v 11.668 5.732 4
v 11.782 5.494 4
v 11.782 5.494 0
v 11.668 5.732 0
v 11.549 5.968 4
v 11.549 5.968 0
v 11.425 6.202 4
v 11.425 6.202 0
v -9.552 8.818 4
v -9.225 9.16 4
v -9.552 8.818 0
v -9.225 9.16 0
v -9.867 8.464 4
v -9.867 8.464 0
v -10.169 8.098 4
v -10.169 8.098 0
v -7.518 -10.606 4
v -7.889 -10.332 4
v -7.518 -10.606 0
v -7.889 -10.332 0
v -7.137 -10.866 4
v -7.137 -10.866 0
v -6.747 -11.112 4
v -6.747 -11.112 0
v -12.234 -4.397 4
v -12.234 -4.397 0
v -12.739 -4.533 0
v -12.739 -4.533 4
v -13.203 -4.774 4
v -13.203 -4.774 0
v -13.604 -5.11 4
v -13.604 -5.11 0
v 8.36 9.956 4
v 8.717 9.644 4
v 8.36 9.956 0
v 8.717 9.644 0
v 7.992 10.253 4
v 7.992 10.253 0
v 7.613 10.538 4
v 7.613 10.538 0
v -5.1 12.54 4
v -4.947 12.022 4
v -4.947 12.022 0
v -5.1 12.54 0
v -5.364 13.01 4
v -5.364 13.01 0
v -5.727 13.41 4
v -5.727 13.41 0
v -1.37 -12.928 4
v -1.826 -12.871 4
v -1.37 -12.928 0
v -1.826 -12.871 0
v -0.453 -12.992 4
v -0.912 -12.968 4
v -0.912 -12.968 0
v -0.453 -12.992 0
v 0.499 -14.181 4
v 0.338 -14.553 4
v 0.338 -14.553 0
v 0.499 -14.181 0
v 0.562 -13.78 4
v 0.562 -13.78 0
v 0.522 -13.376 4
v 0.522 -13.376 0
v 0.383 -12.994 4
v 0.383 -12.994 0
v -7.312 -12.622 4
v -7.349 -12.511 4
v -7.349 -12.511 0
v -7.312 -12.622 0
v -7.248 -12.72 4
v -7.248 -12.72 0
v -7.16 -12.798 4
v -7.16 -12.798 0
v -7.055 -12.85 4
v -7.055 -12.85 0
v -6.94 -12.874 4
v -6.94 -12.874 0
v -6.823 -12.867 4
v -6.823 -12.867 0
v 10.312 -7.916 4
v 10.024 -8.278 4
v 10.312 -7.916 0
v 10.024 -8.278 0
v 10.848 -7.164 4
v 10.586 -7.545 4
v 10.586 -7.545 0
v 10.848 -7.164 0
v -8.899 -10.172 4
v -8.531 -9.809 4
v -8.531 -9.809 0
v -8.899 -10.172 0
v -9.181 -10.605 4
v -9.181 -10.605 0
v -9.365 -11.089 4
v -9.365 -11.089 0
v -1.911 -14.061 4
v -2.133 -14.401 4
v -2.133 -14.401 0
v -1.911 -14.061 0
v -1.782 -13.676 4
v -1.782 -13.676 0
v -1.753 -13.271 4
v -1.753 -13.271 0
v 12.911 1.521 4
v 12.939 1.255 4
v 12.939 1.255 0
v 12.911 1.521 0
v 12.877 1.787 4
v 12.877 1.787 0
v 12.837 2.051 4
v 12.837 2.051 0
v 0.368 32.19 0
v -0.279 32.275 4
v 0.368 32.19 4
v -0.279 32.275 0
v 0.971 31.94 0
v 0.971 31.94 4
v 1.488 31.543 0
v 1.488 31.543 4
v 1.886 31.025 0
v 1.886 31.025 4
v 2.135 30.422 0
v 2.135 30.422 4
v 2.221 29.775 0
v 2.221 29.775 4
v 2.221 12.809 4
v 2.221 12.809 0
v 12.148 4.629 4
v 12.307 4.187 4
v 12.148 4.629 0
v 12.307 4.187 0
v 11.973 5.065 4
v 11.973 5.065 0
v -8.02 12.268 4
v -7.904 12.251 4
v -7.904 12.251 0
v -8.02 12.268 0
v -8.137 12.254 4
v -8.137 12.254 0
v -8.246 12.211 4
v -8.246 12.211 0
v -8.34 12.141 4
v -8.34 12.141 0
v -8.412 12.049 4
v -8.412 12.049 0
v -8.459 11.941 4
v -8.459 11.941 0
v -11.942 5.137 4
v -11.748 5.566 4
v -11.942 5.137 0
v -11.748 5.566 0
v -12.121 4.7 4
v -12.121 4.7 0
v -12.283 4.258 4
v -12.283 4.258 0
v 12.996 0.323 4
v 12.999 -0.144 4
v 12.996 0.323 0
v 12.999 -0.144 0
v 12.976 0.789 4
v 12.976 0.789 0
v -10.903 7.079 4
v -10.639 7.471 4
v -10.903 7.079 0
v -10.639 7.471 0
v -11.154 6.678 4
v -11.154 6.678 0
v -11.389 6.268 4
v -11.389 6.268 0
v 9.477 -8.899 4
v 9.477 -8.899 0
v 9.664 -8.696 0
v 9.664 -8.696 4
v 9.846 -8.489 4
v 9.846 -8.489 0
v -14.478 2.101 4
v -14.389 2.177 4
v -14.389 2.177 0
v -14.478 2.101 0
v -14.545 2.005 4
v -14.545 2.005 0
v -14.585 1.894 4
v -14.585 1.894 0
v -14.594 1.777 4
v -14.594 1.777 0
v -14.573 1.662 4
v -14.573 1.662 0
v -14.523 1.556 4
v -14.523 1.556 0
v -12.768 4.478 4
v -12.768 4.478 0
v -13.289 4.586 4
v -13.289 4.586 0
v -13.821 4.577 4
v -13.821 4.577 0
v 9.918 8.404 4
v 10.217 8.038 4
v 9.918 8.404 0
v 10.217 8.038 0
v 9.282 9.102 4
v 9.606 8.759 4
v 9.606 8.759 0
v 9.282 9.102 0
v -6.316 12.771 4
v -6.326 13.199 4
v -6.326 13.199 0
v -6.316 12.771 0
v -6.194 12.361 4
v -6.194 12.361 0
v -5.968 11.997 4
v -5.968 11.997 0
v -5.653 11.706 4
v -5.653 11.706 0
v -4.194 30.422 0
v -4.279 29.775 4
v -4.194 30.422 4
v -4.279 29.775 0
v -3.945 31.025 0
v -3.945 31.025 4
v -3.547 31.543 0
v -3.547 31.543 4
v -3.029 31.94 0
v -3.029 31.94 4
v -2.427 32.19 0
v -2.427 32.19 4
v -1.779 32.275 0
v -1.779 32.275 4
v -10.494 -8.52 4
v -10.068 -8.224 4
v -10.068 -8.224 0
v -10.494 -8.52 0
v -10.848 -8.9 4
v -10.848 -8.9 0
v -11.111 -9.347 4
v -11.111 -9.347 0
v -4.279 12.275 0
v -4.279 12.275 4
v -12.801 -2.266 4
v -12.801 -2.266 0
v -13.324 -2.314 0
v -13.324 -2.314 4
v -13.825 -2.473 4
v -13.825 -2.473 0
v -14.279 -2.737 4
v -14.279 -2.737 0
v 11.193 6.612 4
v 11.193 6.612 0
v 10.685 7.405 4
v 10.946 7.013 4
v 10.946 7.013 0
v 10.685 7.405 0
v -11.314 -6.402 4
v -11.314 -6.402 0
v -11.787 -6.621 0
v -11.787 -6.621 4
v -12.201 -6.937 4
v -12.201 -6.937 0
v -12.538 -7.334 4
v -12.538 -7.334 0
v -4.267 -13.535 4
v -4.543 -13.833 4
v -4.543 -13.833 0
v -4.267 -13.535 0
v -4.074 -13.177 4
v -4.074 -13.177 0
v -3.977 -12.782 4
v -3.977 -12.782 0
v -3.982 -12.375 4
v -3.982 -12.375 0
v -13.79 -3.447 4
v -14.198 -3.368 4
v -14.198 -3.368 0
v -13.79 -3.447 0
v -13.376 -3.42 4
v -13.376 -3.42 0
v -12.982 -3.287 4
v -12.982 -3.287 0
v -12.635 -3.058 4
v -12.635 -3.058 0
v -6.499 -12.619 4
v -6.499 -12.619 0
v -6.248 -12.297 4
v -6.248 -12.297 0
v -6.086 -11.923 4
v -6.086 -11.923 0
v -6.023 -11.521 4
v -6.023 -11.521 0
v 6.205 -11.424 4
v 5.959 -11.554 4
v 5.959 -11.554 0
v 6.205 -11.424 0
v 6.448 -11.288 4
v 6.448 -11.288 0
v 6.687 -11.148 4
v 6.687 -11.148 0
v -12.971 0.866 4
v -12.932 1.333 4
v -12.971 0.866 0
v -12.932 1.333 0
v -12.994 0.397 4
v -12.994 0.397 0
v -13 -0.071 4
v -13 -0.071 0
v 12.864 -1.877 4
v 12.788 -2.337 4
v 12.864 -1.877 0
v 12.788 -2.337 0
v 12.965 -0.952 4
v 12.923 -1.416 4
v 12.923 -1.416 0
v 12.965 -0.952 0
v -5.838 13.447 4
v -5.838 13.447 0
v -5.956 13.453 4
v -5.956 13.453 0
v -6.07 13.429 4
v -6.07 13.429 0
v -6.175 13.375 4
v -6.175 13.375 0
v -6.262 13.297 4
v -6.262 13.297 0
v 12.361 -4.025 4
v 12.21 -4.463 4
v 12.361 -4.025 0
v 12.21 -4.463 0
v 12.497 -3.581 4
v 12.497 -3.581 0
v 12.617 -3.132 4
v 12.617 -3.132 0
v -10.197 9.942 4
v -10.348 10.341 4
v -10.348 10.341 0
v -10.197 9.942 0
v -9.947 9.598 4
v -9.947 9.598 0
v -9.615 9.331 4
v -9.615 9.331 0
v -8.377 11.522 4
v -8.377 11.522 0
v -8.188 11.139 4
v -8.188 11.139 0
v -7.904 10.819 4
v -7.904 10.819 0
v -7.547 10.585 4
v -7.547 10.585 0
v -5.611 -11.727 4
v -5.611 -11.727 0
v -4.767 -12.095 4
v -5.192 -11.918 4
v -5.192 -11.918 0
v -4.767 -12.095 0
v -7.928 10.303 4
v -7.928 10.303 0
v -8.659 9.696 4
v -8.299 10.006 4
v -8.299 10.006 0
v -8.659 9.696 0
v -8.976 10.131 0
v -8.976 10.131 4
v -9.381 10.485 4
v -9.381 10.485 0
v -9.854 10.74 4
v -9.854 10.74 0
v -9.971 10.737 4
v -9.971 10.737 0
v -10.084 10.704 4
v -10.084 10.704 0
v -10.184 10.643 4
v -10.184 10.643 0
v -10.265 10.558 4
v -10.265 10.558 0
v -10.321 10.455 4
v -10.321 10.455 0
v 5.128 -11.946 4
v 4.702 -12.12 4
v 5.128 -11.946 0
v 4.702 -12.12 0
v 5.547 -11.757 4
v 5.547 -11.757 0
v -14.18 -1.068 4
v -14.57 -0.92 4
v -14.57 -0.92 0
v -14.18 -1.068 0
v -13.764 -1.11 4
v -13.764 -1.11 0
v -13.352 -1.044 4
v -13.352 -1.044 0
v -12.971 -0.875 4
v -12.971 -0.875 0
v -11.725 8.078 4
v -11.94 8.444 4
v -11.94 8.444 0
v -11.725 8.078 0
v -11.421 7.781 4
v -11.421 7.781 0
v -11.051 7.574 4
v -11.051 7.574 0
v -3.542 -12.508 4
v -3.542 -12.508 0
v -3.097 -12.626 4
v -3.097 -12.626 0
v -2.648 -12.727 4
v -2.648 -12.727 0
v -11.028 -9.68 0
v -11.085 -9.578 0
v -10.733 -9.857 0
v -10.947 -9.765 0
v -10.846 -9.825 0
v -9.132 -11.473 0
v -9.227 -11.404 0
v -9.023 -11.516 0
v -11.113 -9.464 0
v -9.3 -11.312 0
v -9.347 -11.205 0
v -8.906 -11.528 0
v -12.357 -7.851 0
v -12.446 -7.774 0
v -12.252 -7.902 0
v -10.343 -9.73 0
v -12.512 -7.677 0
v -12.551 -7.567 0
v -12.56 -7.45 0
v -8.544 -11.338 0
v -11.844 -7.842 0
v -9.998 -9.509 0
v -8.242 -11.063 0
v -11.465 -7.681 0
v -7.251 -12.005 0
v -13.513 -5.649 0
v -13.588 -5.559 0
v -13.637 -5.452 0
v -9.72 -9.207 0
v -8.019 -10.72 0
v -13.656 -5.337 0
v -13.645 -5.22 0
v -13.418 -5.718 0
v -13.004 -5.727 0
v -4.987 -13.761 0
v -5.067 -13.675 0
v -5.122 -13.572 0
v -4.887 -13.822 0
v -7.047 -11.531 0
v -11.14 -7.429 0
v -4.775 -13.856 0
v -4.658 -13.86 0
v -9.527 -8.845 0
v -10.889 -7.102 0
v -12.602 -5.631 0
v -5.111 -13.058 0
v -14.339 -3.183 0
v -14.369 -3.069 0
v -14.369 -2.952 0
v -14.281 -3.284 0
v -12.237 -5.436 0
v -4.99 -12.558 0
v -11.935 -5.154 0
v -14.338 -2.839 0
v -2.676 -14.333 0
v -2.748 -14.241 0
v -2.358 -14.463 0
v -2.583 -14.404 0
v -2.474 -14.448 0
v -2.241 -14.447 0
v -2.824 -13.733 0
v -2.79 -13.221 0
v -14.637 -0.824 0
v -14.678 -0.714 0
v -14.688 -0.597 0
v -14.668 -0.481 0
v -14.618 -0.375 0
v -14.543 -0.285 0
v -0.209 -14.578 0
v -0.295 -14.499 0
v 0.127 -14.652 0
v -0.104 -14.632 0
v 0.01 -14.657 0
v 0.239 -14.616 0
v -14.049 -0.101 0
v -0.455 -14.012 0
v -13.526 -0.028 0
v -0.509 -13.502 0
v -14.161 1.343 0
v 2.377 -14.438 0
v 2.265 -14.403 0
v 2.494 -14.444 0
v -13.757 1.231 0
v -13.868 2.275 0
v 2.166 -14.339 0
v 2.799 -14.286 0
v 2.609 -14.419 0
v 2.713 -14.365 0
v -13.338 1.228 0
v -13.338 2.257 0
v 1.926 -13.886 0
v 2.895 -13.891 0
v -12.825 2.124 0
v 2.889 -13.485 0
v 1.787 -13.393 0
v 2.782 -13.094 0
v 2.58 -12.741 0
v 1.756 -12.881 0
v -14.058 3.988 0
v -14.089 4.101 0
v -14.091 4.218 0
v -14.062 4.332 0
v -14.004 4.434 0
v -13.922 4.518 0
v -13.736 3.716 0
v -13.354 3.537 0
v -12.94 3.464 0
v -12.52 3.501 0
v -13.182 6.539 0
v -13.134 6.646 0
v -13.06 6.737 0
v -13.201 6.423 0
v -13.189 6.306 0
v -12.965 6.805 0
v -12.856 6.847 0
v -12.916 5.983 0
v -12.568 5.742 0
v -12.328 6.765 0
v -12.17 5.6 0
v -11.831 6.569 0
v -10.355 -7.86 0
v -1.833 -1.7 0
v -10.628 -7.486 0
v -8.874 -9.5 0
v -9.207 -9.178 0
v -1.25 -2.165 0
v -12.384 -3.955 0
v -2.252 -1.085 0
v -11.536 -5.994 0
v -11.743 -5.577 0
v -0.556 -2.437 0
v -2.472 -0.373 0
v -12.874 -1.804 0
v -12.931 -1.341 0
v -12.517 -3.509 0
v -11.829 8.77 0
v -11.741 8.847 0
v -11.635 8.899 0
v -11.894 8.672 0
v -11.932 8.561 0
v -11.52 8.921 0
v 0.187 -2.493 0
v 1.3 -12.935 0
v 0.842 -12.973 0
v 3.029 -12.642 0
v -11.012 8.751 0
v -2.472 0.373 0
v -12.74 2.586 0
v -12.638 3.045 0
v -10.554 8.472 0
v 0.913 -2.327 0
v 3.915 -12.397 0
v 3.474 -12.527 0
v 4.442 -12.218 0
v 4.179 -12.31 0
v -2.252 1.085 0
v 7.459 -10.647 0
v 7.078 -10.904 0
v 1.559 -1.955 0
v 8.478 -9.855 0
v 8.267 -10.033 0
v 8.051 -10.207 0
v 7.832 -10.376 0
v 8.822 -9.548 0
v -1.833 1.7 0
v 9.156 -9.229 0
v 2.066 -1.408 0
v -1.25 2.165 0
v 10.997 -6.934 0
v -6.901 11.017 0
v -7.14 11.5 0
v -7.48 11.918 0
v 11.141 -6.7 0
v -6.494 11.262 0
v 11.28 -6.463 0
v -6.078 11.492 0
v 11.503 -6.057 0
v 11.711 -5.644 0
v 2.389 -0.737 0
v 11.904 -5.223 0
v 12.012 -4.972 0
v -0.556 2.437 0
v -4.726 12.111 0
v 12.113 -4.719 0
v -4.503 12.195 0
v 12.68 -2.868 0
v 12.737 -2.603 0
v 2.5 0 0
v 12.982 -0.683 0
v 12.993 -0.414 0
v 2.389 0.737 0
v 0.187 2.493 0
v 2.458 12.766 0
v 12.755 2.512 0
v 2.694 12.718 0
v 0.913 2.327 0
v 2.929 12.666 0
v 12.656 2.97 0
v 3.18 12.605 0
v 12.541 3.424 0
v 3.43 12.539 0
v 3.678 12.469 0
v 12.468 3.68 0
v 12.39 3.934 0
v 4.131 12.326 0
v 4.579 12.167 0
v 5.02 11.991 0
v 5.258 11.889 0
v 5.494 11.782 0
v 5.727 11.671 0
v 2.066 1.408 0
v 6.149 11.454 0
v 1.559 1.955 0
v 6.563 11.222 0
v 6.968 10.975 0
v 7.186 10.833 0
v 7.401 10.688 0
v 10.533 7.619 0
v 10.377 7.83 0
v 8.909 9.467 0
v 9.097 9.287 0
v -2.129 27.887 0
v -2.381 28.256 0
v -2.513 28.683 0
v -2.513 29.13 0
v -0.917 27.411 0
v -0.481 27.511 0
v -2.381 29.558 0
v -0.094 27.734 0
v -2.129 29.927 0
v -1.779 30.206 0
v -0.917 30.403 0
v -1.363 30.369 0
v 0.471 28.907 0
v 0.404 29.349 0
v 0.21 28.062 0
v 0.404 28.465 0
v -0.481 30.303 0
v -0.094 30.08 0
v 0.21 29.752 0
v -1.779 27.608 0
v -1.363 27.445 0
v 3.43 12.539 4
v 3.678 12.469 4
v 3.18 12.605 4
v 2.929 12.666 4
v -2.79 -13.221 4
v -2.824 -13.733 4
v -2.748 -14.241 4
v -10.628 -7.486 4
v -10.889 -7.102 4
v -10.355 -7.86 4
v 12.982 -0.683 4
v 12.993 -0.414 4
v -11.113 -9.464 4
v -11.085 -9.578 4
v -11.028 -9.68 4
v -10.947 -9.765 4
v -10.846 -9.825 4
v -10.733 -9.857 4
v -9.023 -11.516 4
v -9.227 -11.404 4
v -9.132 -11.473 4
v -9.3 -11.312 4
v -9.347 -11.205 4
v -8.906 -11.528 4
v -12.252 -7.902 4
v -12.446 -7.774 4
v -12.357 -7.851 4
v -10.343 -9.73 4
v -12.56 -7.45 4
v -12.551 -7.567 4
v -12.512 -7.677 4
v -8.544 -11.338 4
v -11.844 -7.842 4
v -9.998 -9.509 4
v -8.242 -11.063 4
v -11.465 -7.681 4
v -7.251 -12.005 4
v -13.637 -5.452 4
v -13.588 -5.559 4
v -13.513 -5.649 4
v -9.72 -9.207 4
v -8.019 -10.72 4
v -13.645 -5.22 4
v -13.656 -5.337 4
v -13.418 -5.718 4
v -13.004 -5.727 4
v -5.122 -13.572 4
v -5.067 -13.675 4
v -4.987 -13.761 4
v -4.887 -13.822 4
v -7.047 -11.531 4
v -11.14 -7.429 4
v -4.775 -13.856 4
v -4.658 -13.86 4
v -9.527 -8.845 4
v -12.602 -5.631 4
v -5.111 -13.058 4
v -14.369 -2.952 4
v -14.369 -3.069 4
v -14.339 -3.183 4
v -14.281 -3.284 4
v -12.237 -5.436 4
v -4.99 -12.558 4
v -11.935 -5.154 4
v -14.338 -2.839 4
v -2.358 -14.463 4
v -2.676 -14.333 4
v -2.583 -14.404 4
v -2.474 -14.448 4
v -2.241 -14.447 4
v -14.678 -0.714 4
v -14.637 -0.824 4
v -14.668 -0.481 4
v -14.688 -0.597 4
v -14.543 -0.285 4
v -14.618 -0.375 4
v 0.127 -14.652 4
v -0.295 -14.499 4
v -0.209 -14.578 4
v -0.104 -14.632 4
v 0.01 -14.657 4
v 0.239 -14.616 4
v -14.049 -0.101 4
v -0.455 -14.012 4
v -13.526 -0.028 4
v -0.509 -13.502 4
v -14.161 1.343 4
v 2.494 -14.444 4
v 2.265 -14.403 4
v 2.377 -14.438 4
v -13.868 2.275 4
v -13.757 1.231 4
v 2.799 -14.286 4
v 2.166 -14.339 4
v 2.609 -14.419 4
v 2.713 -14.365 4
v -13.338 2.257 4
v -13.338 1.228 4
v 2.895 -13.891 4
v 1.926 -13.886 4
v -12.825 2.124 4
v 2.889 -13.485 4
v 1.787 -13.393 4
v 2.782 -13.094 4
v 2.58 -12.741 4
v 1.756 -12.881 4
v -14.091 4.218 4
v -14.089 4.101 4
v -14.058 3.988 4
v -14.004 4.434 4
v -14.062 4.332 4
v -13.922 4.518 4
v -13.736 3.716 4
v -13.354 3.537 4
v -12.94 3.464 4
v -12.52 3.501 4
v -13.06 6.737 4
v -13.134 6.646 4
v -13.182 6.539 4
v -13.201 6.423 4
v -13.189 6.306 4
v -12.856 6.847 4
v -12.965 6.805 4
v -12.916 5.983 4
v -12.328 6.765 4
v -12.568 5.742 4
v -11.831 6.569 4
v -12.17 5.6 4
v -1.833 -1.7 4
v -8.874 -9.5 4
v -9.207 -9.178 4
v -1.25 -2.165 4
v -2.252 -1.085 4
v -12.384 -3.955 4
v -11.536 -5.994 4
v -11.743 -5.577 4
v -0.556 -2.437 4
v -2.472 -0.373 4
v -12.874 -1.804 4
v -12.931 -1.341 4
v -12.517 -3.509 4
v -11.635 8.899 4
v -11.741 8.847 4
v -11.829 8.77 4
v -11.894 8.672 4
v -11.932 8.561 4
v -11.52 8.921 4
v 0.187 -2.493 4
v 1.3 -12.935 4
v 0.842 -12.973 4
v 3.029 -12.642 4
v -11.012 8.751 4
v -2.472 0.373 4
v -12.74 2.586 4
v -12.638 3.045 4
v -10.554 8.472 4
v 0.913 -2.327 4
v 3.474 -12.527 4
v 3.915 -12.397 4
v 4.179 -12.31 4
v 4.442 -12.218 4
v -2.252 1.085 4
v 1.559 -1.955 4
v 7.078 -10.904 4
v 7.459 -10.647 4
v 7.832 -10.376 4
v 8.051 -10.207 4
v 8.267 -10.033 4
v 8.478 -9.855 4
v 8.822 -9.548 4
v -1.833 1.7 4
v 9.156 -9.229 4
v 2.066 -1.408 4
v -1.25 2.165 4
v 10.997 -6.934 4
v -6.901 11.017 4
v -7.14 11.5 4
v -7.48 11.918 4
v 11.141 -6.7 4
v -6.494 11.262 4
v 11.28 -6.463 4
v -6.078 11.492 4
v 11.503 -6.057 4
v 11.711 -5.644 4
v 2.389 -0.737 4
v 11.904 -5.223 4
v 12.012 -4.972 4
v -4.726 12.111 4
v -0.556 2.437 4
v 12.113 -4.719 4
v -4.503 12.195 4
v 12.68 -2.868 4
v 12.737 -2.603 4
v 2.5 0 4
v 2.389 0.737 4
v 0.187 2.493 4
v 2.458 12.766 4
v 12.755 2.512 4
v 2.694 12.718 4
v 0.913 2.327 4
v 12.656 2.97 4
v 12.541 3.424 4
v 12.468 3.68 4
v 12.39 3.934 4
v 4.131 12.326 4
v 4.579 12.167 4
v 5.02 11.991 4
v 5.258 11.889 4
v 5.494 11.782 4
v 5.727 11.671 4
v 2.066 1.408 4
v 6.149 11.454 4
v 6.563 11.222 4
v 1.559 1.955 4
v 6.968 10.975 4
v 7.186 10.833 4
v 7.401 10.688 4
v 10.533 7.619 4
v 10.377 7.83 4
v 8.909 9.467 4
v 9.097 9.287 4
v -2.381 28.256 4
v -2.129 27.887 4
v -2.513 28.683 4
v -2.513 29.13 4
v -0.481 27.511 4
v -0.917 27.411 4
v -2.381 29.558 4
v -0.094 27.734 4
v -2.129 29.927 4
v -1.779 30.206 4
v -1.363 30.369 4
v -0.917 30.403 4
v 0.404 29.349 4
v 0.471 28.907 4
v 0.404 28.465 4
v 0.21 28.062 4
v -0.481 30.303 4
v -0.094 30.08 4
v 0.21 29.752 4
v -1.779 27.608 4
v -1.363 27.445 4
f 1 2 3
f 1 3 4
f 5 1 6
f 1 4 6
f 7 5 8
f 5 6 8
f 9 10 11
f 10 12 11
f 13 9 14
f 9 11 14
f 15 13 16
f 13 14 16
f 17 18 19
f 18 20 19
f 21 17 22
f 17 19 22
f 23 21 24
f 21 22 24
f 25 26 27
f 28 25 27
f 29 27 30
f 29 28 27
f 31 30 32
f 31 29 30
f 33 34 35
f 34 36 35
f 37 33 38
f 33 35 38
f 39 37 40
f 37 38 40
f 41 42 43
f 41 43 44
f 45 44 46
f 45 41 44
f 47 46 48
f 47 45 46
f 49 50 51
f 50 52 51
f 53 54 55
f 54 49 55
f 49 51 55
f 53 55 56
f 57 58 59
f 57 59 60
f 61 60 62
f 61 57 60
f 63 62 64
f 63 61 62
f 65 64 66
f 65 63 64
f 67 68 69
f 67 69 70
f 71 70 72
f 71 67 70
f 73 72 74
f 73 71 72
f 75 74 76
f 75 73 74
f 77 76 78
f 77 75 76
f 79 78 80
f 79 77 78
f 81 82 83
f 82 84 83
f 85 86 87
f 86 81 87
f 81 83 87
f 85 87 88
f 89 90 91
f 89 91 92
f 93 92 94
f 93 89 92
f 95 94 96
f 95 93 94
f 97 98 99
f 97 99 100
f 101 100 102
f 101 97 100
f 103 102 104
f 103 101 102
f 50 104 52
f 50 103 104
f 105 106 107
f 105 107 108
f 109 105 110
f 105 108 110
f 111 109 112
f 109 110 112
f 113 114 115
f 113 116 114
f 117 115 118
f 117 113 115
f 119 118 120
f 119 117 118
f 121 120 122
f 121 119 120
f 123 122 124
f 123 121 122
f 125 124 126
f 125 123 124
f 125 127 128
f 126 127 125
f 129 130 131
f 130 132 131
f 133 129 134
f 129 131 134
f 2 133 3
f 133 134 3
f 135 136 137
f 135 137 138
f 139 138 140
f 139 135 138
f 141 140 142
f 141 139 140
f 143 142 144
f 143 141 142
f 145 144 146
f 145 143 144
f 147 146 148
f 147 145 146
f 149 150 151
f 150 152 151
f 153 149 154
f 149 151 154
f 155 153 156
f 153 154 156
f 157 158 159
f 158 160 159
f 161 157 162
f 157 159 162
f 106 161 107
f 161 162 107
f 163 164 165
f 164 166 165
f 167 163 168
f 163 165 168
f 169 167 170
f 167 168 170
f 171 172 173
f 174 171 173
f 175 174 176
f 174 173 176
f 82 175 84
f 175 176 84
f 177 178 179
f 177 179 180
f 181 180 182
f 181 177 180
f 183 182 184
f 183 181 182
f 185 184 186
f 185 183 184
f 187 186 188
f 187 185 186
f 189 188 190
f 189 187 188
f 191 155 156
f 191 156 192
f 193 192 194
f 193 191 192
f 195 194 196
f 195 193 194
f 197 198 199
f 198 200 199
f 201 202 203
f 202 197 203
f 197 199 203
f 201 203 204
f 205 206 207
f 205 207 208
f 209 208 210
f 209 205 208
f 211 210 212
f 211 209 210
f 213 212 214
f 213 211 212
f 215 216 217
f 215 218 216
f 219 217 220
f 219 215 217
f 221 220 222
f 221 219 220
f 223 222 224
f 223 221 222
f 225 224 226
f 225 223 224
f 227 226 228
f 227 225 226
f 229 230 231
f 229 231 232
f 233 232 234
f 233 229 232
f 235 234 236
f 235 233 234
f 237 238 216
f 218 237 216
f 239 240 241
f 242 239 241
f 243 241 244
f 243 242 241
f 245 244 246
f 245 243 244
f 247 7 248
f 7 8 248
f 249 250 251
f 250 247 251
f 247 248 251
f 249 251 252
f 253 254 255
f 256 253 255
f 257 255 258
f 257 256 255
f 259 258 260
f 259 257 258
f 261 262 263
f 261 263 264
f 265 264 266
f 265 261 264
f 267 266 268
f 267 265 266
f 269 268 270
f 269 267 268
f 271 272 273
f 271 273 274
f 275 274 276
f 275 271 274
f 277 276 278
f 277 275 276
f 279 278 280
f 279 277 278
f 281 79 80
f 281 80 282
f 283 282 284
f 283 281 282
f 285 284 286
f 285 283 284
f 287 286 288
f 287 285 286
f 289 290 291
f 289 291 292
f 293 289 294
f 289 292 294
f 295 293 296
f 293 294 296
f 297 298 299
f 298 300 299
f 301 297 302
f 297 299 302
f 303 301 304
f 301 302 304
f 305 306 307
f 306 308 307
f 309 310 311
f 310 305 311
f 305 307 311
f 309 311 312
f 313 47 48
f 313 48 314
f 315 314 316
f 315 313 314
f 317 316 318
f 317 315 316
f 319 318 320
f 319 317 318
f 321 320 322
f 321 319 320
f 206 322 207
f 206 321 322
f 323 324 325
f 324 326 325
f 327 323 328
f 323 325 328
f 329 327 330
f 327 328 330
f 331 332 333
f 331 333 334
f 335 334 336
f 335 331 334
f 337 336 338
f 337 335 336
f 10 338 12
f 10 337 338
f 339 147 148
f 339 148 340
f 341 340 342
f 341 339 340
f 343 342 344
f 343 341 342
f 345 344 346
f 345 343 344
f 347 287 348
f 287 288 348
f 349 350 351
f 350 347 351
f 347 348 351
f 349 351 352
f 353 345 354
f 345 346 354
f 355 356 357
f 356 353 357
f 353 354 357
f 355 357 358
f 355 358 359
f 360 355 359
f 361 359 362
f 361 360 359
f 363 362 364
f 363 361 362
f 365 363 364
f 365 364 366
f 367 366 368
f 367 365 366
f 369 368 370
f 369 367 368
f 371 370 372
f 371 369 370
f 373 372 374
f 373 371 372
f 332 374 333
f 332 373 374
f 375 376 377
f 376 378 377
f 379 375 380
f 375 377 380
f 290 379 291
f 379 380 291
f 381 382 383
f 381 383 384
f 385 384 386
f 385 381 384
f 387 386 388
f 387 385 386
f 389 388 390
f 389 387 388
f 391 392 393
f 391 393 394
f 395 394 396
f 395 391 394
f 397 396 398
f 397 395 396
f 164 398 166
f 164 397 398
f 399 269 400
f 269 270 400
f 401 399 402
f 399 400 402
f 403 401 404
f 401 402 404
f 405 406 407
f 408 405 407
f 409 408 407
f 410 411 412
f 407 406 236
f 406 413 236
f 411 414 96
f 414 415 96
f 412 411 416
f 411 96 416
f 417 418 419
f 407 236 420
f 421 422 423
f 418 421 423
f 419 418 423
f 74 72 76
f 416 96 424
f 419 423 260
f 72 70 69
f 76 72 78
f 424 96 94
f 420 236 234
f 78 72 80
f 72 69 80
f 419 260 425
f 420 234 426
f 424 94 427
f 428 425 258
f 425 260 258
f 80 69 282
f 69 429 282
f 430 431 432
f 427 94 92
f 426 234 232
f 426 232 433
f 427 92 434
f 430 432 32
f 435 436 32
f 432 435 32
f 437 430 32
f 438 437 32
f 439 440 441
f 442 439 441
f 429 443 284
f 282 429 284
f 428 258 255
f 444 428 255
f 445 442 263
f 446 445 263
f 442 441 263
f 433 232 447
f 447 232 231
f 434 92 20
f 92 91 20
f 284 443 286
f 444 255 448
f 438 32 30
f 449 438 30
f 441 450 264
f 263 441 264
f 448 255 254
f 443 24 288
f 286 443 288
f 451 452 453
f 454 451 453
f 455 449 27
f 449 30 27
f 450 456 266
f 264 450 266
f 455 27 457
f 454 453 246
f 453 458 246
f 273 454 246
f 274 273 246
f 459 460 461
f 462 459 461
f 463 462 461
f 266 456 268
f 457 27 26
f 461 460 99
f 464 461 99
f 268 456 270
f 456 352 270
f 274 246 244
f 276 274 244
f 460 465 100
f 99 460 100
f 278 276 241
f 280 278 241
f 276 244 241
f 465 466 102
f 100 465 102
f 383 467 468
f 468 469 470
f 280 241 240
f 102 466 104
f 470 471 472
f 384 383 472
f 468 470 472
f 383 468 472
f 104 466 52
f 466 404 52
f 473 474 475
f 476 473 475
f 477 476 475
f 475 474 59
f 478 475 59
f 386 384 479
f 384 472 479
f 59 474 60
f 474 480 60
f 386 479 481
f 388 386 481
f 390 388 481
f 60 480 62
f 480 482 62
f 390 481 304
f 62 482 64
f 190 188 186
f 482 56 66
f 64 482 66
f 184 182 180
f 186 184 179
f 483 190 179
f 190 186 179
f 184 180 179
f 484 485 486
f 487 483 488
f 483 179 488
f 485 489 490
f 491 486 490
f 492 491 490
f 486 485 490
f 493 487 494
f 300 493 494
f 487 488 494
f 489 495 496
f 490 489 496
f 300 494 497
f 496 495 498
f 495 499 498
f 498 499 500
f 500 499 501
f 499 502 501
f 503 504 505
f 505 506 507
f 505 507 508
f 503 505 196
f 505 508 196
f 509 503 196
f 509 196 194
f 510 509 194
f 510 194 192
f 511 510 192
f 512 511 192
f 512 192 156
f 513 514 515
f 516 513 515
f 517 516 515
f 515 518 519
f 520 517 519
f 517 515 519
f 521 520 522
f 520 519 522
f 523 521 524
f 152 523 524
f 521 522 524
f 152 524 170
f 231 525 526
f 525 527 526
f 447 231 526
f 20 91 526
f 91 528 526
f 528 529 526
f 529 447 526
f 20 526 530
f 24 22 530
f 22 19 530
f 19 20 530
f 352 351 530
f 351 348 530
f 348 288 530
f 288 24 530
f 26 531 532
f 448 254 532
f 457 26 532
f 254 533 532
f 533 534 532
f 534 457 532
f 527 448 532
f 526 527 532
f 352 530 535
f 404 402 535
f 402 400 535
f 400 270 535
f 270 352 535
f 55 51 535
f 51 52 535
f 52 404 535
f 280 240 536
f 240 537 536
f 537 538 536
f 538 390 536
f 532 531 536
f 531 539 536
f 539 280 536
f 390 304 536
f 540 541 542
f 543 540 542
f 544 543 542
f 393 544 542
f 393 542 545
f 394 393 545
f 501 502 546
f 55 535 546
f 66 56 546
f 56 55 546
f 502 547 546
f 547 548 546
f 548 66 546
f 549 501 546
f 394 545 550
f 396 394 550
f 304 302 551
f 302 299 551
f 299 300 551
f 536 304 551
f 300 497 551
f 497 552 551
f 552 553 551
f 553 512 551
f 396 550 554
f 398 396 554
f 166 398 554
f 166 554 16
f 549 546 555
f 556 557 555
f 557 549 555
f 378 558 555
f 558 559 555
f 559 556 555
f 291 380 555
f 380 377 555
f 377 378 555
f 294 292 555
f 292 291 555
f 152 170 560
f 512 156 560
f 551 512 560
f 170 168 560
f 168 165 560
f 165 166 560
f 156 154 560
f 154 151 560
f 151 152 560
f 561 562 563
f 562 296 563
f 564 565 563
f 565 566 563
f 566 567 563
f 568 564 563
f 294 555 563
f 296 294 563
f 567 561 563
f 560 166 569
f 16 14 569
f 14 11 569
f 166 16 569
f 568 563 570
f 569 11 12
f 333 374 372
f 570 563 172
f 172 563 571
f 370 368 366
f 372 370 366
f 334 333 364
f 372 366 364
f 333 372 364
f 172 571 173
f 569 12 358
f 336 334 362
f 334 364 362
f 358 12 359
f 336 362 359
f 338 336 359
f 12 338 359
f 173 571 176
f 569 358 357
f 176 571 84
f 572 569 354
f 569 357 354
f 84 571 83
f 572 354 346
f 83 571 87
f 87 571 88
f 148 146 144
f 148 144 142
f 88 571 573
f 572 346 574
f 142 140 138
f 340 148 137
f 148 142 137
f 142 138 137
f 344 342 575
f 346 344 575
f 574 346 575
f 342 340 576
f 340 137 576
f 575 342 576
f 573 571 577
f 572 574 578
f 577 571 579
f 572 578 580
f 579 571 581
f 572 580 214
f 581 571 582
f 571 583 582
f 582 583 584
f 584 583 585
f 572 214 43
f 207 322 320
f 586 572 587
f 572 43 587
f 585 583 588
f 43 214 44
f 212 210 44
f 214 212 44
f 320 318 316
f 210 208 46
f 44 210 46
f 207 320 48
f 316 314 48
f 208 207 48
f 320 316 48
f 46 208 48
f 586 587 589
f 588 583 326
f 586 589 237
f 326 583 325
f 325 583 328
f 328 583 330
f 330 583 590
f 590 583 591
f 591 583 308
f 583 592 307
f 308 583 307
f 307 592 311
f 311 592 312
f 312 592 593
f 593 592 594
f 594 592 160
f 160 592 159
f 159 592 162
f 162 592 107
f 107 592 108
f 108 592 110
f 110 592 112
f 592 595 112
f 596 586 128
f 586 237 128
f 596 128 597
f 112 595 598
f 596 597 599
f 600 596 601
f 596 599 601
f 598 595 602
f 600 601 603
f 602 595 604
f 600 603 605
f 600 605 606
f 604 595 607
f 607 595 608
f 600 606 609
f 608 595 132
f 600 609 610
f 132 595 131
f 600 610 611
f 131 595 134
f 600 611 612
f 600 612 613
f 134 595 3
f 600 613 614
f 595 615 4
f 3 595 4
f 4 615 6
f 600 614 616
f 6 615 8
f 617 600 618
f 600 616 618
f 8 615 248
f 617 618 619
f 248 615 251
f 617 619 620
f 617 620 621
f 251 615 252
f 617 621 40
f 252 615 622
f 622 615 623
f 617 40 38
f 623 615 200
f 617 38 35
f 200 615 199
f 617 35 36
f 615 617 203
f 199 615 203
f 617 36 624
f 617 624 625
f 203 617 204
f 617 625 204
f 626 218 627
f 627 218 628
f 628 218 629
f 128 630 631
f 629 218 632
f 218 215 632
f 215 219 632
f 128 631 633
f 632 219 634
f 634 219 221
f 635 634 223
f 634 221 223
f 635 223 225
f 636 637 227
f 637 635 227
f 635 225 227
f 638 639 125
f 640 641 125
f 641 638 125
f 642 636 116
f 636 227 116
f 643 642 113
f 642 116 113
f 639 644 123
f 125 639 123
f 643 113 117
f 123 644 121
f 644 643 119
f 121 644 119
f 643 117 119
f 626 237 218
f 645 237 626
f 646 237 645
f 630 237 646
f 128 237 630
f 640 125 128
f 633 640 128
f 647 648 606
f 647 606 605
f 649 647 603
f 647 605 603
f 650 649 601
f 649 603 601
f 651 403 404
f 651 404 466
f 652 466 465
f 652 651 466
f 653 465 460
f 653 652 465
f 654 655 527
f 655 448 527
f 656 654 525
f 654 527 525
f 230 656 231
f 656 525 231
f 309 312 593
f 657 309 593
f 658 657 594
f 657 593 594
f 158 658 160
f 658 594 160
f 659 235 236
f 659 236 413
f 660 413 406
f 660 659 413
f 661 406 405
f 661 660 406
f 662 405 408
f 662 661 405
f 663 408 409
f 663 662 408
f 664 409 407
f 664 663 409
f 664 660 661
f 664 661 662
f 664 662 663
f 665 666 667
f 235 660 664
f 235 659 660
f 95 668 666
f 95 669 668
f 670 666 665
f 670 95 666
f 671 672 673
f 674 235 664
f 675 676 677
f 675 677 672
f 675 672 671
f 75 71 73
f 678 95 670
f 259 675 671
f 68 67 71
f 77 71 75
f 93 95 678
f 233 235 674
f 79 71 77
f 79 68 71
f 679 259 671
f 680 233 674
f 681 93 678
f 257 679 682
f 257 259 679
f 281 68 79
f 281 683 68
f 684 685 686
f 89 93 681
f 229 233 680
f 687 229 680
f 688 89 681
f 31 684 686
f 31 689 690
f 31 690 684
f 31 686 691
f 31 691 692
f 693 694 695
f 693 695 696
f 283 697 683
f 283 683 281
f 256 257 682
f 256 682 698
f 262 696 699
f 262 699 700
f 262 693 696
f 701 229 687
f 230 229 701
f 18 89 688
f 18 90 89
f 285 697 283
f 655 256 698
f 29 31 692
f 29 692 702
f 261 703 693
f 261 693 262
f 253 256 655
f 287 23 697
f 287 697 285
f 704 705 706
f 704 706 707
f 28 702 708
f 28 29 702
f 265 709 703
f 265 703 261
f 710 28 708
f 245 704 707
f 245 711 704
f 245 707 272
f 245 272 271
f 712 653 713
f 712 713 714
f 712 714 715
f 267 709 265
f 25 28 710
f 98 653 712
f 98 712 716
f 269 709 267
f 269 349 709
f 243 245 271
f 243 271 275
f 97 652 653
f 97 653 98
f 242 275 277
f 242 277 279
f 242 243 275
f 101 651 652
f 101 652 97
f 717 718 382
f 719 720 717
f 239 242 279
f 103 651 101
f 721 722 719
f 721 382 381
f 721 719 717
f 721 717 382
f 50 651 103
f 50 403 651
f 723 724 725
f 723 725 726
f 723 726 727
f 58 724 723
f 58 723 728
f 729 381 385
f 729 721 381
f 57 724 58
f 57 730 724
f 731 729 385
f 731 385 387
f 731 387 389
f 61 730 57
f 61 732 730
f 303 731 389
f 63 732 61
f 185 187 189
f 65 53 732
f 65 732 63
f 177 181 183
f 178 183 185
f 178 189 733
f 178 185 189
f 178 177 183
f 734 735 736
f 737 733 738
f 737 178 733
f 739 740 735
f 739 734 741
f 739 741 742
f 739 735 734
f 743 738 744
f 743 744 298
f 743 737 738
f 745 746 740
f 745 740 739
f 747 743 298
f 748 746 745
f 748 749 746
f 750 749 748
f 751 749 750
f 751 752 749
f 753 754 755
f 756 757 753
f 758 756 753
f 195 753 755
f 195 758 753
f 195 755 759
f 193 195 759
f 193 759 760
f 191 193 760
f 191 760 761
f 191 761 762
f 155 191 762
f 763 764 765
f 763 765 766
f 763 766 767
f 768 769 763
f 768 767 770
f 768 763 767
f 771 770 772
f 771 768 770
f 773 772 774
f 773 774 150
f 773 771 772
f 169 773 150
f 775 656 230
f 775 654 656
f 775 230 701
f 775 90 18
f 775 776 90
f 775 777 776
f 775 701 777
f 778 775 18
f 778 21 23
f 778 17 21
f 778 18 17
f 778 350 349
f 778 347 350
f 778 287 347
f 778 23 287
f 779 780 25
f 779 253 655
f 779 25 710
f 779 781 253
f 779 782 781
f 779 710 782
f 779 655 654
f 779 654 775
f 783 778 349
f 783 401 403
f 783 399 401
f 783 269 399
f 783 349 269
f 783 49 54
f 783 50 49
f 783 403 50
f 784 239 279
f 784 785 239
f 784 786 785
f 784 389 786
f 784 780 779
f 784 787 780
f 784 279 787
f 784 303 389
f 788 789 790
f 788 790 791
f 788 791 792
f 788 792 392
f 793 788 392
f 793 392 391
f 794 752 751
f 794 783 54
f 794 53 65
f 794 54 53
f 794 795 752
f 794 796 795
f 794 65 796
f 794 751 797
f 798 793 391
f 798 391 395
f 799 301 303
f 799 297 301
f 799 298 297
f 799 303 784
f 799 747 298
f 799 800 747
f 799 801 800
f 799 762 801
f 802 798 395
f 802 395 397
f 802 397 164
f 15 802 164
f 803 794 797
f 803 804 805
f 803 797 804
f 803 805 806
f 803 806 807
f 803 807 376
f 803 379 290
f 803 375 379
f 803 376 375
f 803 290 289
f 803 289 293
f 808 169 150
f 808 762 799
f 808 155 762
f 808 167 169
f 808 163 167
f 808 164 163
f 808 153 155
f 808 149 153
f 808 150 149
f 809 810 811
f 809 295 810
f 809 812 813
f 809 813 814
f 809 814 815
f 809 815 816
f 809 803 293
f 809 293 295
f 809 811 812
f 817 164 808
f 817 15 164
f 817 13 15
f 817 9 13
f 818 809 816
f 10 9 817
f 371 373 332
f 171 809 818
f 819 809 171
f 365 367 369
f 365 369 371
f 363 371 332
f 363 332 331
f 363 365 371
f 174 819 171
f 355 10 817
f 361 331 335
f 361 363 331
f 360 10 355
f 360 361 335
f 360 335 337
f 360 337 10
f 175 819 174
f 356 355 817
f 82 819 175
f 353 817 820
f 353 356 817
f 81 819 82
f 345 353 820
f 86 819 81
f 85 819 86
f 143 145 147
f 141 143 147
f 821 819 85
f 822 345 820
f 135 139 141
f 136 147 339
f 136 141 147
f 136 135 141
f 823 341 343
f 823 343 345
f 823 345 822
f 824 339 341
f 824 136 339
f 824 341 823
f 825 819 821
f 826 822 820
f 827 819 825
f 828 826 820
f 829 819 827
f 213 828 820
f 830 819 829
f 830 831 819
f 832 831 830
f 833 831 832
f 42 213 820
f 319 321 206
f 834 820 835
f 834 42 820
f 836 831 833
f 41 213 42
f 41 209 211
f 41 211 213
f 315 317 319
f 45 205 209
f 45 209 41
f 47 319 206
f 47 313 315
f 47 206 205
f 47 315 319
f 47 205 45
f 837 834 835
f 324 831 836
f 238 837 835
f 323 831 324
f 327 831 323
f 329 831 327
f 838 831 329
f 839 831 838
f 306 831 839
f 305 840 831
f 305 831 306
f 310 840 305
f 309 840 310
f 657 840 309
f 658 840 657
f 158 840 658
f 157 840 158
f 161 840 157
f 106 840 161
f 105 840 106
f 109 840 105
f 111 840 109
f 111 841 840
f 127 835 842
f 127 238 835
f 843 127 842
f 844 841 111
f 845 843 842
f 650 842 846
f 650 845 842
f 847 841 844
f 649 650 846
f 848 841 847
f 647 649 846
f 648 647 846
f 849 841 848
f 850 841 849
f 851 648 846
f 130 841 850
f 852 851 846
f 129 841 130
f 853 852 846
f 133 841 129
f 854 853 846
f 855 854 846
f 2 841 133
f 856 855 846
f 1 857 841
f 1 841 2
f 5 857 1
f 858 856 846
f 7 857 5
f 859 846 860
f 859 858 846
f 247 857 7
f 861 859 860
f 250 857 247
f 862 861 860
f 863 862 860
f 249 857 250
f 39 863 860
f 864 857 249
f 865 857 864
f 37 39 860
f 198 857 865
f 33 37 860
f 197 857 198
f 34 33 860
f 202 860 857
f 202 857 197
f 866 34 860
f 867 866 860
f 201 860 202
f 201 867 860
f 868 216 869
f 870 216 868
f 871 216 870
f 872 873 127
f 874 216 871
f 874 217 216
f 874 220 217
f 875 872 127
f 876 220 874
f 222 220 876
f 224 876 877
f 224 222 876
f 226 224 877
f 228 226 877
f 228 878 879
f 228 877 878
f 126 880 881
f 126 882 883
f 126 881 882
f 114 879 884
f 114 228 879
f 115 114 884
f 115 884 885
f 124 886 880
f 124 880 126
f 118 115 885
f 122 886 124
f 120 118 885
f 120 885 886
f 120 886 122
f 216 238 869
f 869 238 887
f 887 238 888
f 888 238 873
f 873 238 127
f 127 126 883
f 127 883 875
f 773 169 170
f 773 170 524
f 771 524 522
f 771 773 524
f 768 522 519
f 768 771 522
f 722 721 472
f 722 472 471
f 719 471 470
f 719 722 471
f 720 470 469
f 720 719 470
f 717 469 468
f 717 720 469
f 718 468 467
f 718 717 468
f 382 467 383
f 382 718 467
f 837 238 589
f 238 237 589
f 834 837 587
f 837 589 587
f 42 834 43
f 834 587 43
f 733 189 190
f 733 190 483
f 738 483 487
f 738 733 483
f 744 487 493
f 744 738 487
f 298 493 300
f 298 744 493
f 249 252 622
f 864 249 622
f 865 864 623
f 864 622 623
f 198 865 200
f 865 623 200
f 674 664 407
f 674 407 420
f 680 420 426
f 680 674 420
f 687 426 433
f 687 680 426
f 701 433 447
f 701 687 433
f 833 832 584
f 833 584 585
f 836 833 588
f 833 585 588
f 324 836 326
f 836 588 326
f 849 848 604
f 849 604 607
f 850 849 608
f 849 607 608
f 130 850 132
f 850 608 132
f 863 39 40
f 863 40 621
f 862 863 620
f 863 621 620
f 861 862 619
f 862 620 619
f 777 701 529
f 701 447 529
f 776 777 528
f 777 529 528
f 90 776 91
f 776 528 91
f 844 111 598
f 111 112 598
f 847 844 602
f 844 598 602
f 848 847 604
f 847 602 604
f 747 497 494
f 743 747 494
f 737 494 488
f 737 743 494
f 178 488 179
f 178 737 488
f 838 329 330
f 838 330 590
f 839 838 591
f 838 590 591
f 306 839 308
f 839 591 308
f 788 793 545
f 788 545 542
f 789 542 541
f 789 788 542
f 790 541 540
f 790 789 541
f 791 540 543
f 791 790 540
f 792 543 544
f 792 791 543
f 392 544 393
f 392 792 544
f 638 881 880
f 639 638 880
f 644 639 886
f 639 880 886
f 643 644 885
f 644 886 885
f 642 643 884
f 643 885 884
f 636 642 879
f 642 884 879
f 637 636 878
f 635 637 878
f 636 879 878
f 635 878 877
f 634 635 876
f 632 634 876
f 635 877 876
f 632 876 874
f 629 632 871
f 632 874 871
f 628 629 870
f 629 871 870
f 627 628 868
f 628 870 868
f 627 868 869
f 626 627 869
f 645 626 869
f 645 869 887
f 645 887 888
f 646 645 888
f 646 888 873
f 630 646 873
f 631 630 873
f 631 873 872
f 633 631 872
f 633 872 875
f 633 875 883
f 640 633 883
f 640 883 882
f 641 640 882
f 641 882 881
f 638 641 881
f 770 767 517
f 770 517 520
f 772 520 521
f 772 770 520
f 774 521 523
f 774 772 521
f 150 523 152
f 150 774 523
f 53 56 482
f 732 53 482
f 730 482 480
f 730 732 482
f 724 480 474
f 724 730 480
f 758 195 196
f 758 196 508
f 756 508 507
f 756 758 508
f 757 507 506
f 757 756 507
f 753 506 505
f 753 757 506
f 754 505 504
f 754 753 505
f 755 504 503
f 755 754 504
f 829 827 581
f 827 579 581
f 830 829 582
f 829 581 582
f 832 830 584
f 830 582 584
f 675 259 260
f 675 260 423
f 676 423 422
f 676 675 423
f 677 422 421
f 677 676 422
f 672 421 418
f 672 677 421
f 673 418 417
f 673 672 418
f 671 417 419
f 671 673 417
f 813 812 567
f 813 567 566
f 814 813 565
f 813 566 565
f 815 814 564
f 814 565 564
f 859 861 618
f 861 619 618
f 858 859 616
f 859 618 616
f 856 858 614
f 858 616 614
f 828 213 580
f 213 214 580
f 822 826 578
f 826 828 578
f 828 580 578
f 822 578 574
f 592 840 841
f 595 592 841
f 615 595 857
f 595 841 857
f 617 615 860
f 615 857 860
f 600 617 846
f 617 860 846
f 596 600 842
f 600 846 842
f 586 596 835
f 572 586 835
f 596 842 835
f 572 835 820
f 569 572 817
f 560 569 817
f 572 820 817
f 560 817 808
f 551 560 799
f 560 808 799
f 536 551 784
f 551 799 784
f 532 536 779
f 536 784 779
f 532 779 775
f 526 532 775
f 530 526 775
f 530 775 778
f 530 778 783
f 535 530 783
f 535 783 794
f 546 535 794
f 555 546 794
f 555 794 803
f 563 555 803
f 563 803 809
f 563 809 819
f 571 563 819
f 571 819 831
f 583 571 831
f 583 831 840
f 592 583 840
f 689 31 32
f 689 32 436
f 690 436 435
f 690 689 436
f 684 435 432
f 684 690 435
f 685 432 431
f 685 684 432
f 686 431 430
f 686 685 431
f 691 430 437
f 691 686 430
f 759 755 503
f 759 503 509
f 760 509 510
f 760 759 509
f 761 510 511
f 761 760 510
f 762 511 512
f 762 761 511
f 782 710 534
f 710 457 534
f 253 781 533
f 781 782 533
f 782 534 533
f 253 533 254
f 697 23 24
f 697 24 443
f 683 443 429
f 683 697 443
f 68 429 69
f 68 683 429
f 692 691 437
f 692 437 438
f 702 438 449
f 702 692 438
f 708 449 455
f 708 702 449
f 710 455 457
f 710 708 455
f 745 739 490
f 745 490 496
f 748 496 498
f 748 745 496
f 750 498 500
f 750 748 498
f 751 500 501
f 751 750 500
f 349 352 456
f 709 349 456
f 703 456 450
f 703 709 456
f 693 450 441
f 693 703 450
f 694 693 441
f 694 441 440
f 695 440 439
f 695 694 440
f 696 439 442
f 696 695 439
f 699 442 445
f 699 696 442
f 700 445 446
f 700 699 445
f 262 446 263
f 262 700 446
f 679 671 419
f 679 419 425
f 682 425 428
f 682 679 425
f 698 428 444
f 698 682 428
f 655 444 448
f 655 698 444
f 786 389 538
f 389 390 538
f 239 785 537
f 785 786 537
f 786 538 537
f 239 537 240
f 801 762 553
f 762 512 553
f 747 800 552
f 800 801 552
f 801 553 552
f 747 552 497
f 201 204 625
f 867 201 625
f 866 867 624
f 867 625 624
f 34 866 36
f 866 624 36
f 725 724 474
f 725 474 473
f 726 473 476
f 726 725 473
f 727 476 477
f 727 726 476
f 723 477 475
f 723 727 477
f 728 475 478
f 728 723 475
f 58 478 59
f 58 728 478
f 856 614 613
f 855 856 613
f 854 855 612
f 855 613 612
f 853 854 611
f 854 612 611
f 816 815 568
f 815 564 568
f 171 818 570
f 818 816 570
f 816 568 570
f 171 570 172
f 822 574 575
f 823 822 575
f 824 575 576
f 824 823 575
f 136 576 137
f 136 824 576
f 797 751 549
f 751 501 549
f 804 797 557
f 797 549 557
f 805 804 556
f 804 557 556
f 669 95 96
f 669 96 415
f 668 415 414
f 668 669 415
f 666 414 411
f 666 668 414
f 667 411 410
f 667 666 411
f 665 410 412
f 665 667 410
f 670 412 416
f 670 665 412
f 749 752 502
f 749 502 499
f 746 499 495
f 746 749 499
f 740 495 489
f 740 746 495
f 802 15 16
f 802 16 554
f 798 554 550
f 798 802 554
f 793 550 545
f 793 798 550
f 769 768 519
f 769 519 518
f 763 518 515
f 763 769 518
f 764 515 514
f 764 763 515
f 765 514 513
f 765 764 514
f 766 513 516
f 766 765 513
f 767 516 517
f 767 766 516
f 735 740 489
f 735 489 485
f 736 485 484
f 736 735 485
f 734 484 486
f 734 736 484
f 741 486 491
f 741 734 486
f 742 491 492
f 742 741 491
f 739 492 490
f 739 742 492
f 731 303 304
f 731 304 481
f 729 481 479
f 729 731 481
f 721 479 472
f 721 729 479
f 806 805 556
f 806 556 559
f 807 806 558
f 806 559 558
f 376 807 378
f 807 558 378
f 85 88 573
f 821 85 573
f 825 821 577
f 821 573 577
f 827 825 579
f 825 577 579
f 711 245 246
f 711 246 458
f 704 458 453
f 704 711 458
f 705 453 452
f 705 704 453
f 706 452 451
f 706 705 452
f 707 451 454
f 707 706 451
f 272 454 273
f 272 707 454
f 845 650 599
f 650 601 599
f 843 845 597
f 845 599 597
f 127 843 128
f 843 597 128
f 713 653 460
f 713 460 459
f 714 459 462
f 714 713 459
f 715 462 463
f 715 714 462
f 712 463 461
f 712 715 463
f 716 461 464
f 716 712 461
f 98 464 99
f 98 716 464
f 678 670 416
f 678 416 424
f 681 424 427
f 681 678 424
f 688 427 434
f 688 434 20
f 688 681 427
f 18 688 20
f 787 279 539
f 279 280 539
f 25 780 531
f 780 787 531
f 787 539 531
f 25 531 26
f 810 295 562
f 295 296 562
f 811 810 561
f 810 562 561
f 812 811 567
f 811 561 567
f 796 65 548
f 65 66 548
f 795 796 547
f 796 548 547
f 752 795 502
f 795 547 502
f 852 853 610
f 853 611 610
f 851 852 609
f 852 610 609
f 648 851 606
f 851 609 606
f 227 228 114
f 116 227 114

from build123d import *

# Parameters (mm, degrees)
SKETCH1_R           = 13
BOSS_EXTRUDE1_DEPTH = 4
BOSS_EXTRUDE2_DEPTH = 4
CIRPATTERN1_COUNT   = 37
CUT_EXTRUDE1_START  = -6
CUT_EXTRUDE1_DEPTH  = 6
SKETCH5_W           = 6.5
SKETCH5_H           = 20
BOSS_EXTRUDE3_DEPTH = 4
FILLET1_R           = 2.5
SKETCH6_R           = 2.5
CUT_EXTRUDE2_DEPTH  = 36.685455193
SKETCH7_R           = 1.5
CUT_EXTRUDE3_DEPTH  = 36.685455193


with BuildPart() as part:
    # Sketch1 → Boss-Extrude1 (new body)
    with BuildSketch(Plane.XY):
        Circle(SKETCH1_R)
    extrude(amount=BOSS_EXTRUDE1_DEPTH)

    # Sketch2 → Boss-Extrude2 (add)
    with BuildSketch(Plane.XY.offset(4)):
        with BuildLine():
            Line((-1.442756516, 12.919692475), (-0.673396871, 12.982547387))
            ThreePointArc((-0.673396871, 12.982547387), (-0.676161598, 13.791154594), (-0.946073249, 14.553388784))
            ThreePointArc((-0.946073249, 14.553388784), (-1.263795502, 14.68499365), (-1.581517754, 14.553388784))
            ThreePointArc((-1.581517754, 14.553388784), (-1.735779337, 13.717545135), (-1.442756516, 12.919692475))
        make_face()
    boss_extrude2 = extrude(amount=-BOSS_EXTRUDE2_DEPTH)

    # CirPattern1: Boss-Extrude2 ×37 about axis
    cirpattern1_axis = Axis((-0.003550518, 0.04085181, 0), (0, 0, 1))
    for i in range(1, CIRPATTERN1_COUNT):
        add(boss_extrude2.rotate(cirpattern1_axis, i * 360 / CIRPATTERN1_COUNT))

    # Sketch3 → Cut-Extrude1 (cut)
    with BuildSketch(Plane.XY.offset(4).offset(CUT_EXTRUDE1_START)):
        with BuildLine():
            ThreePointArc((2.580226265, -12.741366976), (12.998773331, -0.178582984), (2.929279614, 12.665674911))
            ThreePointArc((2.929279614, 12.665674911), (2.706489738, 14.000196281), (3.492602617, 15.101381624))
            ThreePointArc((3.492602617, 15.101381624), (15.498537433, -0.212925866), (3.076423624, -15.191629856))
            ThreePointArc((3.076423624, -15.191629856), (3.335791003, -13.863732578), (2.580226265, -12.741366976))
        make_face()
    extrude(amount=CUT_EXTRUDE1_DEPTH, mode=Mode.SUBTRACT)

    # Sketch5 → Boss-Extrude3 (add)
    with BuildSketch(Plane.XY.offset(4)):
        with Locations((-1.029483868, 22.275423326)):
            Rectangle(SKETCH5_W, SKETCH5_H)
    extrude(amount=-BOSS_EXTRUDE3_DEPTH)

    # Fillet1
    fillet1_edges = [part.edges().sort_by_distance(p)[0] for p in [
        (2.220516132, 32.275423326, 2),
        (-4.279483868, 32.275423326, 2),
    ]]
    fillet(fillet1_edges, radius=FILLET1_R)

    # Sketch6 → Cut-Extrude2 (cut, through all)
    with BuildSketch(Plane.XY.offset(4)):
        Circle(SKETCH6_R)
    extrude(amount=-CUT_EXTRUDE2_DEPTH, mode=Mode.SUBTRACT)

    # Sketch7 → Cut-Extrude3 (cut, through all)
    with BuildSketch(Plane.XY.offset(4)):
        with Locations((-1.029483868, 28.906928641)):
            Circle(SKETCH7_R)
    extrude(amount=-CUT_EXTRUDE3_DEPTH, mode=Mode.SUBTRACT)


solid = part.part
